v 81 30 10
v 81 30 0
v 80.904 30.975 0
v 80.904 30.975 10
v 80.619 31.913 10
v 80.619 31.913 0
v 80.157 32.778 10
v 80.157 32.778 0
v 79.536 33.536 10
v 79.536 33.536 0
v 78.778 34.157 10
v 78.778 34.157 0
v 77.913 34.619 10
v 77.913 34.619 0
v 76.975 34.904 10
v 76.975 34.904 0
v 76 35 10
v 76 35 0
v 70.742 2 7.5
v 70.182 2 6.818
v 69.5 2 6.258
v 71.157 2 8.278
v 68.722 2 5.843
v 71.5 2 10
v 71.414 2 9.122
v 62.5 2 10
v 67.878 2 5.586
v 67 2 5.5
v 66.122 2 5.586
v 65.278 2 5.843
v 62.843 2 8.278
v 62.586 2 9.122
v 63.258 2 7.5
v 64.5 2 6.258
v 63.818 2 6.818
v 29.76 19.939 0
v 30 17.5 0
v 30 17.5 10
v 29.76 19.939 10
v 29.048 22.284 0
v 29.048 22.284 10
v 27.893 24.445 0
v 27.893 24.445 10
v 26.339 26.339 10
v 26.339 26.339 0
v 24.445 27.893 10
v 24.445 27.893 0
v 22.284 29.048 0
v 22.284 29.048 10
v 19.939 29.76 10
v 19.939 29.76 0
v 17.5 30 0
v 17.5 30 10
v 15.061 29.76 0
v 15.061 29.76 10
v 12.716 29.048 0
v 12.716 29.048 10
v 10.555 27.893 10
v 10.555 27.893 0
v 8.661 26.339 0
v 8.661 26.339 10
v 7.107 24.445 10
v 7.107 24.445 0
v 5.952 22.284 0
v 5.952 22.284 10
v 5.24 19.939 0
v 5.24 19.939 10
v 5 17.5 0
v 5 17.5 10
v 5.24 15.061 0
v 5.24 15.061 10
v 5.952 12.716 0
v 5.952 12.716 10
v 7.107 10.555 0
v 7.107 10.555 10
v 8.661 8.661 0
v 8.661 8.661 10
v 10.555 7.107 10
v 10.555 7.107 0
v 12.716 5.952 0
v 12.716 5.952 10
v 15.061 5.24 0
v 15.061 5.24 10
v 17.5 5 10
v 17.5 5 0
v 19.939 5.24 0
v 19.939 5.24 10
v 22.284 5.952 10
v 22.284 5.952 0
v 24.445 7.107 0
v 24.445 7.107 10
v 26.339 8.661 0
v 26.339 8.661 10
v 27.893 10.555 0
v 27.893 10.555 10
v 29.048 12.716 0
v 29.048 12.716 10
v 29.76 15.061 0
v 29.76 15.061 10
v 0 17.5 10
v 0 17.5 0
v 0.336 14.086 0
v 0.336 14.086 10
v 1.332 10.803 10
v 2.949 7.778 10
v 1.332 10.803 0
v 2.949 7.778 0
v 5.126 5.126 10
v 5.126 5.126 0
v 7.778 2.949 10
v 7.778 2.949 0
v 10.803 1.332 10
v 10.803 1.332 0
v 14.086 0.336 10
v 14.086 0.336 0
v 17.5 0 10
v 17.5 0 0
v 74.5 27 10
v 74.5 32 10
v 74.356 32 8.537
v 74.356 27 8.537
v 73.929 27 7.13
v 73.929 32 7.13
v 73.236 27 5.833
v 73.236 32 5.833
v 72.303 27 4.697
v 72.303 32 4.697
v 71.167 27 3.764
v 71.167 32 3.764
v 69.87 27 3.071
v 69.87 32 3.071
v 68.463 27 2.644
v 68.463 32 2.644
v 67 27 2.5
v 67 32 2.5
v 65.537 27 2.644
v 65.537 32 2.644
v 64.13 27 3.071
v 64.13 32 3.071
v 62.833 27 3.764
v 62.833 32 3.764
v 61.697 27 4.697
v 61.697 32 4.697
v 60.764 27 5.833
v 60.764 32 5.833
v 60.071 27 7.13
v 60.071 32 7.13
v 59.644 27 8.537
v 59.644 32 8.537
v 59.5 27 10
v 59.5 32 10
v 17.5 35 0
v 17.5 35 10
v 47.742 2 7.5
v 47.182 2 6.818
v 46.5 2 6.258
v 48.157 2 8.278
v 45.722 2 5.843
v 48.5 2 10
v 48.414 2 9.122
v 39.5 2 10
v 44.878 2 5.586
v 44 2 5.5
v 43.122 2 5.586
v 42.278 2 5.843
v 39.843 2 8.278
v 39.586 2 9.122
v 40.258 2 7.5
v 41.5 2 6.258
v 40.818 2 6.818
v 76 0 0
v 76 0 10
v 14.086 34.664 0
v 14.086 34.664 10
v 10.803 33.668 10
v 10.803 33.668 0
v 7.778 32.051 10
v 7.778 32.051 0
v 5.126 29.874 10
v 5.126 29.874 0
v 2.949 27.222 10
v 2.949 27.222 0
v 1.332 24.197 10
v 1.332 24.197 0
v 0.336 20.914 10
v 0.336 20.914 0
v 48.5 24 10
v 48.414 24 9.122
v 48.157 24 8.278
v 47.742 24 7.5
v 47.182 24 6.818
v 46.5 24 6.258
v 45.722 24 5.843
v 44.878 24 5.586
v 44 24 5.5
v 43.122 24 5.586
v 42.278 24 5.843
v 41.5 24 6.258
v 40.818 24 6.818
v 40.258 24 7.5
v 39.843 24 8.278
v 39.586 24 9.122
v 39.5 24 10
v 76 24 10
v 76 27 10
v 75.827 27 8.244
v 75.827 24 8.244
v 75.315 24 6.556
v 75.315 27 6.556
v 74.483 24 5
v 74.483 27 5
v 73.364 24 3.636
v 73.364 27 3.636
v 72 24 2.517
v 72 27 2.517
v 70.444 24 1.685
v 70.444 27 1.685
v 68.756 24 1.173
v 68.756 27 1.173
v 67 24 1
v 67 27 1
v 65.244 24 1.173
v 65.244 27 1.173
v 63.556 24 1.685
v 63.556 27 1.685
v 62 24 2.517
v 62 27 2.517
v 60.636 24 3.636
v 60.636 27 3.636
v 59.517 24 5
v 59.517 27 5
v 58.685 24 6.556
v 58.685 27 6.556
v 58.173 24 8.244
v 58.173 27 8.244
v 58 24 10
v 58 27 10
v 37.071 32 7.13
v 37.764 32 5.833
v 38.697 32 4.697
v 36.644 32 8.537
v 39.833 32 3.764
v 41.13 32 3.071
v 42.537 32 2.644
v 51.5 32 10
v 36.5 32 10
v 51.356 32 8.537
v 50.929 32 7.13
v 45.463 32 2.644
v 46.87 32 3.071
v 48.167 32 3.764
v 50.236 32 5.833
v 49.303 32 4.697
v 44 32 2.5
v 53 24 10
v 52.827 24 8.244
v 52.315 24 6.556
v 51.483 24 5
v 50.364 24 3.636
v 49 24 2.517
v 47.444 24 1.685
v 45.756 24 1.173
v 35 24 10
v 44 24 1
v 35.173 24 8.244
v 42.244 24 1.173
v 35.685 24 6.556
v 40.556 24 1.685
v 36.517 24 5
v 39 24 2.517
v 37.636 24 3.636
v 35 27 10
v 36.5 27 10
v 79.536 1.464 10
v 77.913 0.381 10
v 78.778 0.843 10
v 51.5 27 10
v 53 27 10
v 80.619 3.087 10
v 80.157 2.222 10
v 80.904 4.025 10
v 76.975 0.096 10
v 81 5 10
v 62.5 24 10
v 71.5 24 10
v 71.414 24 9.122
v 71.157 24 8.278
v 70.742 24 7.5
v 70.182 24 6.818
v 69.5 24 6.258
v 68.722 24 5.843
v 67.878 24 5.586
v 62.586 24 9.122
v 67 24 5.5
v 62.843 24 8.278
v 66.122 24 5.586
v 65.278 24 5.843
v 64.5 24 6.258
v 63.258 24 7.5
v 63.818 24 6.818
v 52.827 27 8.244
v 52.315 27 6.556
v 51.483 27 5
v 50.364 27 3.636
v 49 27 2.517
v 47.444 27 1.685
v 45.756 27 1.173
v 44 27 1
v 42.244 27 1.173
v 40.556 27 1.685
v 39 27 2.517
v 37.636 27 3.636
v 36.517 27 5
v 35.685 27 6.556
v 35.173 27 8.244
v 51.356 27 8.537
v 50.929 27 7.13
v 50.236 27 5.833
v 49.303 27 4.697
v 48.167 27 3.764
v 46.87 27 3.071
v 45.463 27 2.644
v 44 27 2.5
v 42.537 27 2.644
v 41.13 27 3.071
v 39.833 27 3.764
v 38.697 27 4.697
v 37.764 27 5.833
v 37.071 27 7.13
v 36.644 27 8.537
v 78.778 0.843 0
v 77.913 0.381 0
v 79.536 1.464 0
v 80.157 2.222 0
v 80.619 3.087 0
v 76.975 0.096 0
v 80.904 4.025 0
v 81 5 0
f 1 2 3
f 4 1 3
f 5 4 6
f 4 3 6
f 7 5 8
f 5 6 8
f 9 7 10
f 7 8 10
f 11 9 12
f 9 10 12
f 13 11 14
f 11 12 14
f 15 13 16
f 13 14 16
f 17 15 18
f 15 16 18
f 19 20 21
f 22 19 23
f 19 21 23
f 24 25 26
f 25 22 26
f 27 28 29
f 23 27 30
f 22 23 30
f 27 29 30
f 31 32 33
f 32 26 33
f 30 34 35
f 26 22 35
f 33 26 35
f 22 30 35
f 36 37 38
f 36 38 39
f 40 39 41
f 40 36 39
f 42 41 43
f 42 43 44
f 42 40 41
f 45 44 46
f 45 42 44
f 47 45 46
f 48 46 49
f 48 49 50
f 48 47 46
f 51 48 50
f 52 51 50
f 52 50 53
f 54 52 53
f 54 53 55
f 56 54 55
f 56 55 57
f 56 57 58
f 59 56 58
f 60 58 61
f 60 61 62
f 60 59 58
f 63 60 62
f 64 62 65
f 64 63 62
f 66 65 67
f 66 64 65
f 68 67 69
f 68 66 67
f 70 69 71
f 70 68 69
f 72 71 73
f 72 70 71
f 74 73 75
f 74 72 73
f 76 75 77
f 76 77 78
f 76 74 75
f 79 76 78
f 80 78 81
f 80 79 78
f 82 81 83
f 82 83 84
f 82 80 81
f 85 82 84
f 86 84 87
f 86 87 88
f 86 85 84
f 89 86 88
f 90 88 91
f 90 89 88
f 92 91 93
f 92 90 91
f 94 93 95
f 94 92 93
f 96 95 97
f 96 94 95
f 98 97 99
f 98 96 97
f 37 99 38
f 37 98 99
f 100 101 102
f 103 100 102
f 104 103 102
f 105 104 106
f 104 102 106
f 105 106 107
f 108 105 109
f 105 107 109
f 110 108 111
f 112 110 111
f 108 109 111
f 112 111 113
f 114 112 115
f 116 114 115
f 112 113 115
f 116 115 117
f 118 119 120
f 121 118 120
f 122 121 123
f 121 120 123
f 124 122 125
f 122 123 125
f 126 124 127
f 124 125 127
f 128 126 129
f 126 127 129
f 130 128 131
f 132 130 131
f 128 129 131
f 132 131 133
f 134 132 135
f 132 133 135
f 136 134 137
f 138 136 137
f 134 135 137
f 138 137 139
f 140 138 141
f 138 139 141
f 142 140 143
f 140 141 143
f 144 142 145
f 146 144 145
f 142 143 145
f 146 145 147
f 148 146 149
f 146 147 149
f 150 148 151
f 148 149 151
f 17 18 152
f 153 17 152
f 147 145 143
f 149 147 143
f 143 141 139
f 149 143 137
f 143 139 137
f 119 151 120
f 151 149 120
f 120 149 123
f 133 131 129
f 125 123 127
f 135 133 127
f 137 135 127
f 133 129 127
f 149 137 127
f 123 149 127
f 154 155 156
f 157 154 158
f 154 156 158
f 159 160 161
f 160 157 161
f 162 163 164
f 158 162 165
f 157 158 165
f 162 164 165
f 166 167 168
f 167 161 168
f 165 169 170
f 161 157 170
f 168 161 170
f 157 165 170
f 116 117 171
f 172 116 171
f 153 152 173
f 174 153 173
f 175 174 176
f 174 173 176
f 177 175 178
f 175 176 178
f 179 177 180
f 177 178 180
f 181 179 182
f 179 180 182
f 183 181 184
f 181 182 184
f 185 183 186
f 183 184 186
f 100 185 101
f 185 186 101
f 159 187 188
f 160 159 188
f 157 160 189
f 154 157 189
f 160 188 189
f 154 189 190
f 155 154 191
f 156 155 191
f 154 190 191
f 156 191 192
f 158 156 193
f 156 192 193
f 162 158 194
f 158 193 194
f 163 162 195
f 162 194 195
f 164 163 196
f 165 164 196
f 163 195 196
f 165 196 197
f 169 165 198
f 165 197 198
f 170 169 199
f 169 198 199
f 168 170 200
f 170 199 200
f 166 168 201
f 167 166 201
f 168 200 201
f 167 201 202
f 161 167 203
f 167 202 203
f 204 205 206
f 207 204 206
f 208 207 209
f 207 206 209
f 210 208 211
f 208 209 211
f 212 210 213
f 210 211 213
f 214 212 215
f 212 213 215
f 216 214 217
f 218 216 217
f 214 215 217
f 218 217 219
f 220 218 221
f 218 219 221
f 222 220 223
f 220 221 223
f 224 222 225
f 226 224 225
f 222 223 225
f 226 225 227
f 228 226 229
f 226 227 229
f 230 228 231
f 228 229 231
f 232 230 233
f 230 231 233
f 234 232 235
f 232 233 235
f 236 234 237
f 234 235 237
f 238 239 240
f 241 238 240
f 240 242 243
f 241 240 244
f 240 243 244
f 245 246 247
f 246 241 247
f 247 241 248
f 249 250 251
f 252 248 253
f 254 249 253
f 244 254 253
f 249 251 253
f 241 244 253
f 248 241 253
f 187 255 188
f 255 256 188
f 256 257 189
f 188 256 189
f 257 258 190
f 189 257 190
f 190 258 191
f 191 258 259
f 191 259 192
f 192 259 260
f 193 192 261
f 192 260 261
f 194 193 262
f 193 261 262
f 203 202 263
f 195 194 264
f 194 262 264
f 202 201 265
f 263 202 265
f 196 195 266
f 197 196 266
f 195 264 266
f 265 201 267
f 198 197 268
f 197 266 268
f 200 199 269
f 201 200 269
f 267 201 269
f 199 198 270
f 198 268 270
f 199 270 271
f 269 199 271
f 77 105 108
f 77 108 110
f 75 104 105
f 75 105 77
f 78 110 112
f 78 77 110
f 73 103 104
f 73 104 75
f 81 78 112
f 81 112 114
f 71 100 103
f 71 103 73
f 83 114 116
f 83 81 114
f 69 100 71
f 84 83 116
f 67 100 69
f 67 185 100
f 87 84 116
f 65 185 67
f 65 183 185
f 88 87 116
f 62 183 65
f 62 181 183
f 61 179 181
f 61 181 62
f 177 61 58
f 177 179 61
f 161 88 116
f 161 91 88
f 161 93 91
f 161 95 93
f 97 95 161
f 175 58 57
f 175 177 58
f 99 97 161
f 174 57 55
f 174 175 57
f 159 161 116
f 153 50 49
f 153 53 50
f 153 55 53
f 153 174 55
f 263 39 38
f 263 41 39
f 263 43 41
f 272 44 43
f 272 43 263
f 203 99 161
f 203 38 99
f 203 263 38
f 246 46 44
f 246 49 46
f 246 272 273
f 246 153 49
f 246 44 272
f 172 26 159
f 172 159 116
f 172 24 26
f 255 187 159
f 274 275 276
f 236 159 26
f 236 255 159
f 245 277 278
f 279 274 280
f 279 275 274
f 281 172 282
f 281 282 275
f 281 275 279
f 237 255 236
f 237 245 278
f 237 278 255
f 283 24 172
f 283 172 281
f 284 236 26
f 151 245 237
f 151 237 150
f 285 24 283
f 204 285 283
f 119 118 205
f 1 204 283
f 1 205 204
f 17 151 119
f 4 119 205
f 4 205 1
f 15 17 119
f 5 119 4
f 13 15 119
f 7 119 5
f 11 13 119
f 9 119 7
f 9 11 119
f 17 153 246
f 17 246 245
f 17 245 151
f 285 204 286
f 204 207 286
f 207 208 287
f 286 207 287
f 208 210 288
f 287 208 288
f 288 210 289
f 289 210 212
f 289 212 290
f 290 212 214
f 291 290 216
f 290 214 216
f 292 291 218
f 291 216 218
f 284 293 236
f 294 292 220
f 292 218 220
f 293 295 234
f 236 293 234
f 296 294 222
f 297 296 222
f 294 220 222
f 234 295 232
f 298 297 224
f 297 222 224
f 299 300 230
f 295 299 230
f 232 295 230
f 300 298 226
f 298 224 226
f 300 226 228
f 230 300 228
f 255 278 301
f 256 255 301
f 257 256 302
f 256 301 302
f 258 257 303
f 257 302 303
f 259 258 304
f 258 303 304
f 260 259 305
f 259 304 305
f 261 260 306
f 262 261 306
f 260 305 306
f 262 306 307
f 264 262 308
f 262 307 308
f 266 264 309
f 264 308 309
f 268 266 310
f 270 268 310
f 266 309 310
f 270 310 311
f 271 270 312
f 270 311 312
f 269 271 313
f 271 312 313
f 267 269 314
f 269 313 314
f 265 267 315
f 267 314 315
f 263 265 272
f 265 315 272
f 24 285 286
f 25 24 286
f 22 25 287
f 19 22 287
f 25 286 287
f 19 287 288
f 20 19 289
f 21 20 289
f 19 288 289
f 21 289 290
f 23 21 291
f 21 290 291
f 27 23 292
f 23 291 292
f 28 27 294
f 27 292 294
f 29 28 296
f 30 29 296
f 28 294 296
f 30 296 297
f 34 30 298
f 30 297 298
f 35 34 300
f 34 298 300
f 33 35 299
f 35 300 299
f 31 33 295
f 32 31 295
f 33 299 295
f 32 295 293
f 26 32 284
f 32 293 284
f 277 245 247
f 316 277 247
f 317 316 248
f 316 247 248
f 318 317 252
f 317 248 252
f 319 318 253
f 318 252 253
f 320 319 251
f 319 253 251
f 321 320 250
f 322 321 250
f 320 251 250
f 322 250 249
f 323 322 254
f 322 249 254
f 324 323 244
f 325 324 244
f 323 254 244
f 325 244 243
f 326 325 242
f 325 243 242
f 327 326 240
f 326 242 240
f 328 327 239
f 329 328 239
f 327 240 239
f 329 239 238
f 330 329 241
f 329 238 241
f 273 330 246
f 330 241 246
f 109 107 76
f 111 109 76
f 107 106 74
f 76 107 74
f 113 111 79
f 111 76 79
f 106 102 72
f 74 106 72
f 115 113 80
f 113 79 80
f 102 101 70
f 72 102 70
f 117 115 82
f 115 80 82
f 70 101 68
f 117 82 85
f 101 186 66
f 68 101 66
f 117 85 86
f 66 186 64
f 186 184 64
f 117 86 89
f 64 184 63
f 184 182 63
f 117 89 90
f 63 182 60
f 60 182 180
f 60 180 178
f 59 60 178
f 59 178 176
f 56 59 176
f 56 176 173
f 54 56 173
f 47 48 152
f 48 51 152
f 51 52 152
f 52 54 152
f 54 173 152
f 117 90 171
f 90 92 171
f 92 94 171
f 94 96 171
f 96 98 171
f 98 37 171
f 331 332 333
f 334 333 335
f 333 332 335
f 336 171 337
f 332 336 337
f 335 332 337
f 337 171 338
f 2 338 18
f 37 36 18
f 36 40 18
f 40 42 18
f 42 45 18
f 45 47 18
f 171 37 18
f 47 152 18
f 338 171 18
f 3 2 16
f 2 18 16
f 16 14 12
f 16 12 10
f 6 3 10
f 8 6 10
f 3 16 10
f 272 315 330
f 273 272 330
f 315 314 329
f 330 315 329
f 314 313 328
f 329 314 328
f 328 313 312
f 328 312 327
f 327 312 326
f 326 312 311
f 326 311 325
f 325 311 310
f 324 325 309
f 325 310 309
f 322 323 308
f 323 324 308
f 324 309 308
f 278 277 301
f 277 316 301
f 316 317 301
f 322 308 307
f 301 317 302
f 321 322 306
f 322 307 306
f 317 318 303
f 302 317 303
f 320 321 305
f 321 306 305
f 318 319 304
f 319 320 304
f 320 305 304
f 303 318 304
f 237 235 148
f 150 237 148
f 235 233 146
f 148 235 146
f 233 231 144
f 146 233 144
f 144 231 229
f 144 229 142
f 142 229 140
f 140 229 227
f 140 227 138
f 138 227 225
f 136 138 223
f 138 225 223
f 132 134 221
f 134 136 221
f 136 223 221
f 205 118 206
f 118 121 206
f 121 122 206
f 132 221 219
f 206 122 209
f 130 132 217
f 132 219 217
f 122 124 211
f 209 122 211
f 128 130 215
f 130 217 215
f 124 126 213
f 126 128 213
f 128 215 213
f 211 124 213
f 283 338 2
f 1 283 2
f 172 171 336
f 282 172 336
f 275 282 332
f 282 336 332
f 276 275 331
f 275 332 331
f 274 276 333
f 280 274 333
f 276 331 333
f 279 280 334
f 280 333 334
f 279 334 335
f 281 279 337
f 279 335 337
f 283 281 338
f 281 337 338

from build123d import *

# Parameters (mm, degrees)
F0_R     = 12.5
F1_DEPTH = 10


with BuildPart() as f1:
    # F0 (on Top) → F1 (new body)
    with BuildSketch(Plane.XY):
        with BuildLine():
            ThreePointArc((0, 17.5), (5.125631, 5.125631), (17.5, 0))
            Line((17.5, 0), (76, 0))
            ThreePointArc((76, 0), (79.535534, 1.464466), (81, 5))
            Line((81, 5), (81, 30))
            ThreePointArc((81, 30), (79.535534, 33.535534), (76, 35))
            Line((76, 35), (17.5, 35))
            ThreePointArc((17.5, 35), (5.125631, 29.874369), (0, 17.5))
        make_face()
        with Locations((17.5, 17.5)):
            Circle(F0_R, mode=Mode.SUBTRACT)
    extrude(amount=F1_DEPTH)

    # F2 (on face) → F3 (revolve, cut)
    with BuildSketch(Plane.XY.offset(10)):
        Polygon((44, 24), (44, 2), (48.5, 2), (48.5, 24), (53, 24), (53, 27), (51.5, 27), (51.5, 32), (44, 32), (44, 27), align=None)
    revolve(axis=Axis((44, 13, 10), (0, 1, 0)), mode=Mode.SUBTRACT)

    # F2 (on face) → F4 (revolve, cut)
    with BuildSketch(Plane.XY.offset(10)):
        Polygon((67, 24), (67, 2), (71.5, 2), (71.5, 24), (76, 24), (76, 27), (74.5, 27), (74.5, 32), (67, 32), (67, 27), align=None)
    revolve(axis=Axis((67, 13, 10), (0, 1, 0)), mode=Mode.SUBTRACT)


solid = f1.part
